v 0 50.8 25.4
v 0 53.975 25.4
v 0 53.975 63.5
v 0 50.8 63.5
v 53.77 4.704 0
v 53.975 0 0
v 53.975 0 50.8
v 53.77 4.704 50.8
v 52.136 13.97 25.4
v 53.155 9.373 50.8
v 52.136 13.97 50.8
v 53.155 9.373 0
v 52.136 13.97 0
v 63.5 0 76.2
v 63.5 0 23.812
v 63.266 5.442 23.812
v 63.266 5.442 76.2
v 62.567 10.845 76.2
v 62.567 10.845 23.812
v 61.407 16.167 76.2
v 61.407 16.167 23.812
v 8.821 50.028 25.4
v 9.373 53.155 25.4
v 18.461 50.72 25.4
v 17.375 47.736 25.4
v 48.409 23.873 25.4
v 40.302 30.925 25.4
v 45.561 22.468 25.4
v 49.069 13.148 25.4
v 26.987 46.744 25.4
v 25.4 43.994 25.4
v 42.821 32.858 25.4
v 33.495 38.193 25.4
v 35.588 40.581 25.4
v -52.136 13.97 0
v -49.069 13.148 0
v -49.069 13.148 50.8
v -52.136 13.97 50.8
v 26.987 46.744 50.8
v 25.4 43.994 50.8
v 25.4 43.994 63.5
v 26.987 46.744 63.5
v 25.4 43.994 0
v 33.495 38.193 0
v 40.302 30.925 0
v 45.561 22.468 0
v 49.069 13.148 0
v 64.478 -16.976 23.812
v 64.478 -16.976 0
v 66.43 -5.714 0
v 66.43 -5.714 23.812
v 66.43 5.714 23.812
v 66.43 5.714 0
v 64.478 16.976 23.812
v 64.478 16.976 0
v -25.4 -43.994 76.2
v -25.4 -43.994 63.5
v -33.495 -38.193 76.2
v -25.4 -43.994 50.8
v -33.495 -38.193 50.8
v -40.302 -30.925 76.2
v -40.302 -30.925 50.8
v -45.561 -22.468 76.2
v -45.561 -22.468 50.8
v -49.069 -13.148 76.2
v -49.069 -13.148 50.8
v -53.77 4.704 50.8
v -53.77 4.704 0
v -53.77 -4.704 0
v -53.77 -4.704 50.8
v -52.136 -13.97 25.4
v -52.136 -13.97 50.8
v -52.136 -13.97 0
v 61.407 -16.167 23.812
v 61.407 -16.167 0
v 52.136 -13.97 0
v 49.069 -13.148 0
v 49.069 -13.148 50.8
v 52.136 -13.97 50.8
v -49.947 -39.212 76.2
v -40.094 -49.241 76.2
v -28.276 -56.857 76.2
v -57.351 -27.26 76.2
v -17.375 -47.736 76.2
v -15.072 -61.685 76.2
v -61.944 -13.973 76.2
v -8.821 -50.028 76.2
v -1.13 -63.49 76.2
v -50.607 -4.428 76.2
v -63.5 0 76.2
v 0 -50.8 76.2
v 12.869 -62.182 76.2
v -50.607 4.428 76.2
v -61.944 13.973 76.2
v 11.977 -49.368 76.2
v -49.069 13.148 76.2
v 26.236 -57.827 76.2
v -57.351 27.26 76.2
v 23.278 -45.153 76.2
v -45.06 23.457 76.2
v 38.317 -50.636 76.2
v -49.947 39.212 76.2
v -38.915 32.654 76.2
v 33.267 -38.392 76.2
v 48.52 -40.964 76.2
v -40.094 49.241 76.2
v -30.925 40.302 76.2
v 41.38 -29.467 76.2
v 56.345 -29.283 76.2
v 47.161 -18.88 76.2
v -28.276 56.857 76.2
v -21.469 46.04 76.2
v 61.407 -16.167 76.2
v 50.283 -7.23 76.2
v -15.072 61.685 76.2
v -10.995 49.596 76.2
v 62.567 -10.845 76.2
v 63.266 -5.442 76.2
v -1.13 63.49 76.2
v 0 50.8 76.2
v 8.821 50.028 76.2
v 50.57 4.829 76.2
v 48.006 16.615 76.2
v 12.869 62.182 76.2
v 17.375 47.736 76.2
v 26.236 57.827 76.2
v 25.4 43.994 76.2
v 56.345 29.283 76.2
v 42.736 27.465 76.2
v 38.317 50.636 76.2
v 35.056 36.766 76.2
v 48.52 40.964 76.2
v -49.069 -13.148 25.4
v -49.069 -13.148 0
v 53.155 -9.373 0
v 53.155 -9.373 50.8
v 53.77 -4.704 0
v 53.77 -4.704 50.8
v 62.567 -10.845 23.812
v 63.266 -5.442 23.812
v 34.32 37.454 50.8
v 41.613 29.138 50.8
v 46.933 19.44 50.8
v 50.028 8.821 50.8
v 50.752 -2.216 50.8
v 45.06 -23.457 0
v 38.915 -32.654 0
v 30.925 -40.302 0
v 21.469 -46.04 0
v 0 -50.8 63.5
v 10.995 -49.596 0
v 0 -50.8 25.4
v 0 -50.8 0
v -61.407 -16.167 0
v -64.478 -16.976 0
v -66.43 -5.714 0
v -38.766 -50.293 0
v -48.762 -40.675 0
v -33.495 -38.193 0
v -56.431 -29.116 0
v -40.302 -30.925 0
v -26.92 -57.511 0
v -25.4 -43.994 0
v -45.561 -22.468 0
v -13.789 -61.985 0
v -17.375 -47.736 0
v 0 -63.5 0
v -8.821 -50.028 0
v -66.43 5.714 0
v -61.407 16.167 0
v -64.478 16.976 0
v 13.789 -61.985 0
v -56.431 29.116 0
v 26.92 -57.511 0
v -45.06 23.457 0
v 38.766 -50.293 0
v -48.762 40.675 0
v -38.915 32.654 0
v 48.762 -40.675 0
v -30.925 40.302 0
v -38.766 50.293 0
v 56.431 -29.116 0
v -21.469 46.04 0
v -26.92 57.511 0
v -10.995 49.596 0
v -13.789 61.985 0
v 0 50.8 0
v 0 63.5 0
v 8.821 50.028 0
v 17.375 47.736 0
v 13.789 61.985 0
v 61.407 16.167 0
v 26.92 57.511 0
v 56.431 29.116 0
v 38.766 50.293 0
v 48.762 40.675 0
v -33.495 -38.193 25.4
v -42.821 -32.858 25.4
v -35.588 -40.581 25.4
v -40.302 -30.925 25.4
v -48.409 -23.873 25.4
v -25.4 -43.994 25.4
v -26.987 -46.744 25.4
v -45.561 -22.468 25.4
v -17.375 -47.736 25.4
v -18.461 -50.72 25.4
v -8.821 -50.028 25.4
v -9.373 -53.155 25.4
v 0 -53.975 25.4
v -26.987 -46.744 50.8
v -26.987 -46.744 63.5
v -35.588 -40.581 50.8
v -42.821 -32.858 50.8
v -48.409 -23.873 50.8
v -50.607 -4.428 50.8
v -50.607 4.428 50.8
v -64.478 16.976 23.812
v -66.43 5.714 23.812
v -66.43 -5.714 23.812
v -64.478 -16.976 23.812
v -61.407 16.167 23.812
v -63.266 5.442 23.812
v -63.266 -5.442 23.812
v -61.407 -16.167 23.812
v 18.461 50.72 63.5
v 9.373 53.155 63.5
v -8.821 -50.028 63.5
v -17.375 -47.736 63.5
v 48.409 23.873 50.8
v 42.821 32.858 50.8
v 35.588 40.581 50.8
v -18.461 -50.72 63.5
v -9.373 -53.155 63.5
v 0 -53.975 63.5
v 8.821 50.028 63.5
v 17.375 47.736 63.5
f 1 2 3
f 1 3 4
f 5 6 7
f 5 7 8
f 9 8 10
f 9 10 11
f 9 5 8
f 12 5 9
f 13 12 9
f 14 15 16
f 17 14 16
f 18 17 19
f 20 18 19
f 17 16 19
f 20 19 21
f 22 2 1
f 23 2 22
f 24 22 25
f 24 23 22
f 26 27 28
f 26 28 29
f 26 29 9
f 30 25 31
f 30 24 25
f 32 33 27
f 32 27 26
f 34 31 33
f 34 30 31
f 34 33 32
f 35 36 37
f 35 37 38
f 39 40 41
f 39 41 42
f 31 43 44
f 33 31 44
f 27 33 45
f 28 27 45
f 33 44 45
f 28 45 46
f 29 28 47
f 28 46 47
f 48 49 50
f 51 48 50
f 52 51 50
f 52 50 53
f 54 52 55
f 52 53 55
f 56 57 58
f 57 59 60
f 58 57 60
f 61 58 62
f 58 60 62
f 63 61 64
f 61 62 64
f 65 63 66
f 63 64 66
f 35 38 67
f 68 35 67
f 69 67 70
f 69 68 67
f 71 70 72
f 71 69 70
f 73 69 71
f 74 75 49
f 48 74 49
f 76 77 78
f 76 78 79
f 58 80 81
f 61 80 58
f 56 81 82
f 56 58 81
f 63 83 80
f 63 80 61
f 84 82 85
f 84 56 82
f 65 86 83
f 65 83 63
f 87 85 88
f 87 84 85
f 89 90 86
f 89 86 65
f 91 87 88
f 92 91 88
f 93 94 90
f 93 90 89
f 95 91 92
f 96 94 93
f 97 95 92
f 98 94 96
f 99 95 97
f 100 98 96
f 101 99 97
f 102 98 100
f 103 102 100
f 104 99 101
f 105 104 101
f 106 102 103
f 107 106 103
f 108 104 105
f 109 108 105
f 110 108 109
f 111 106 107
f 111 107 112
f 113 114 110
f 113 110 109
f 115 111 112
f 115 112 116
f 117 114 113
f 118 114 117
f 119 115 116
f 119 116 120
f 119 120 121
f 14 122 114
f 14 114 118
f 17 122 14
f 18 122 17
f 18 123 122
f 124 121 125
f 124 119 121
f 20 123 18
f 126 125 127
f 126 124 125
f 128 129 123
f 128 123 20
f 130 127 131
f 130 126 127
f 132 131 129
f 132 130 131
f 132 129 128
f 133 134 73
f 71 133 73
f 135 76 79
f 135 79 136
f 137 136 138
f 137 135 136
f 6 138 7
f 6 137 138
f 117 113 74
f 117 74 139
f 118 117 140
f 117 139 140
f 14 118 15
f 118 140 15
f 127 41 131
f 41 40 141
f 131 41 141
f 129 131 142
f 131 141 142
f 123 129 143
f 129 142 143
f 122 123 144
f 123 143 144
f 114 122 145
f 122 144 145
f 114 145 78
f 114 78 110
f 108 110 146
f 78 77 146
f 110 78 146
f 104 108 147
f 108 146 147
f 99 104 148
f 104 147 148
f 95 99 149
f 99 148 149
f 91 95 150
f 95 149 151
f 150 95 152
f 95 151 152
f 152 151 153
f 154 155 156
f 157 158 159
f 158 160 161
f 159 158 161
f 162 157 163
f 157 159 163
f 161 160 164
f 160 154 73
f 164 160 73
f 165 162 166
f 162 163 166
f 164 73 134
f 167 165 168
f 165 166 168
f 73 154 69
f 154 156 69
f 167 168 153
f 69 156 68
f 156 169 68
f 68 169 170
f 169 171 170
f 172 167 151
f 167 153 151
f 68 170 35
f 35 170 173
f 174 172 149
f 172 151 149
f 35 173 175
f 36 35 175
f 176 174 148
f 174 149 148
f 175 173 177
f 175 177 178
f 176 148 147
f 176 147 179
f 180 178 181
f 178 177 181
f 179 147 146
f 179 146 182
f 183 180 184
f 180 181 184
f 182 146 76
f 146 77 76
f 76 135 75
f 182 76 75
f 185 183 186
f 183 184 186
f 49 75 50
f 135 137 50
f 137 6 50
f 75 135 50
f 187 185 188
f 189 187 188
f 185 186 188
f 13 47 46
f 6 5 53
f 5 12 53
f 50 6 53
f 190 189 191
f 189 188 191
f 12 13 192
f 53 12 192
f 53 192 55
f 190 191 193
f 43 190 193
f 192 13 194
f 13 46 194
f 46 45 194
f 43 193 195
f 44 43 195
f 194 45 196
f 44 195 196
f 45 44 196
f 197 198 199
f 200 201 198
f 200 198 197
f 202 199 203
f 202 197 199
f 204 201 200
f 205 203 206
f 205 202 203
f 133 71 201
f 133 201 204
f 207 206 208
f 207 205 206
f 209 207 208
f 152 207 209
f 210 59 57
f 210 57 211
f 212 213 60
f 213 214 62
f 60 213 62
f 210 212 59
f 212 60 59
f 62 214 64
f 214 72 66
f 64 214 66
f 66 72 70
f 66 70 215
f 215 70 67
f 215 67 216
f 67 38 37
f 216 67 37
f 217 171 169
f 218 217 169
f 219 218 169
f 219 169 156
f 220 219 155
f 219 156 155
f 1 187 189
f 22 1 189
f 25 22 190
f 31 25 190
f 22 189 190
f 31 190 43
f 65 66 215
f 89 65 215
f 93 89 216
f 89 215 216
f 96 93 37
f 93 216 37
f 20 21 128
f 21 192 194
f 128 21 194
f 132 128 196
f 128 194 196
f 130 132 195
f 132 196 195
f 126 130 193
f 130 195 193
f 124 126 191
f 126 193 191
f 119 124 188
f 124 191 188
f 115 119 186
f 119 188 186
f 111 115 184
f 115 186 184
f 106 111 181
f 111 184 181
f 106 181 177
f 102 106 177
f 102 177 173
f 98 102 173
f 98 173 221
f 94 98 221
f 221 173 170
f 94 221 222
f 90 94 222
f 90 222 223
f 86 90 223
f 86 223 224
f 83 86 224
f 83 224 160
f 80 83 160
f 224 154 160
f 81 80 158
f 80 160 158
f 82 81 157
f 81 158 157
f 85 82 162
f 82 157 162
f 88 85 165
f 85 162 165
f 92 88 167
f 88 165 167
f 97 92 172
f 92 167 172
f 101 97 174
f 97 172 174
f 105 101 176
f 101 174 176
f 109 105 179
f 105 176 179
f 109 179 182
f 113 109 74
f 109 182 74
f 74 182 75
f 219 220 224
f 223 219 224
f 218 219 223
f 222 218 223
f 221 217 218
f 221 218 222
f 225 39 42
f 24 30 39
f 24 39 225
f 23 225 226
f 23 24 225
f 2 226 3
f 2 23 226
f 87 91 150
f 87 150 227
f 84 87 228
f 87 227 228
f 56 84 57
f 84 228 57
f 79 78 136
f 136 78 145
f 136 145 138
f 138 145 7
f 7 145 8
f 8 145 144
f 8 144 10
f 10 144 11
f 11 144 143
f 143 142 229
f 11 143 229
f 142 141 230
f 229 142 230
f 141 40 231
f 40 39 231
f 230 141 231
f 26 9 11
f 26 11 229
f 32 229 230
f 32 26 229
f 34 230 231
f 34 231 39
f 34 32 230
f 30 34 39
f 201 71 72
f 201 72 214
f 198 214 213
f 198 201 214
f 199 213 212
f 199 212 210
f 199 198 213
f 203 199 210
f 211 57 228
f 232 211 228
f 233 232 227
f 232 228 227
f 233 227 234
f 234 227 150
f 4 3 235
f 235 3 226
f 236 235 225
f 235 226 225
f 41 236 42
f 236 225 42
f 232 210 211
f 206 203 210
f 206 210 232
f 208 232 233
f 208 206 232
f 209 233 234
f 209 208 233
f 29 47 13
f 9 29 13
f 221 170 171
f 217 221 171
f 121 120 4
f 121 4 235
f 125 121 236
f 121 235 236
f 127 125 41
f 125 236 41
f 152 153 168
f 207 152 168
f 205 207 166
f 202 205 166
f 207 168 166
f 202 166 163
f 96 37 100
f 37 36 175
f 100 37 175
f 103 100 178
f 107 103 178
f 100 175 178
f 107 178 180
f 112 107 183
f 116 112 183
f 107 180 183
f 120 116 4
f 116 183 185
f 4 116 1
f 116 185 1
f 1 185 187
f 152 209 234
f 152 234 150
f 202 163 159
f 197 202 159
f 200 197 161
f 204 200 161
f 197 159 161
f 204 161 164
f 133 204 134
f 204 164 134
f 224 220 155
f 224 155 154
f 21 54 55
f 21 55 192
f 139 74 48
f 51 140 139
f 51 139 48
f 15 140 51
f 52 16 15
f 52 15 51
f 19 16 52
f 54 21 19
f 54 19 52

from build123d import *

# Parameters (mm, degrees)
F1_DEPTH = 76.2
F2_DEPTH = 23.8125
F3_DEPTH = 50.8
F4_DEPTH = 63.5
F5_DEPTH = 25.4


# Not quite as in the source:
# - a feature names something its author has since deleted; it is built from what else it names


with BuildPart() as f1:
    # F0 (on Top) → F1 (new body)
    with BuildSketch(Plane.XY):
        with BuildLine():
            ThreePointArc((61.4074185531, -16.1672182717), (62.9746817305, -8.151040482), (63.5, 0))
            ThreePointArc((63.5, 0), (62.9746817305, 8.151040482), (61.4074185531, 16.1672182717))
            ThreePointArc((61.4074185531, 16.1672182717), (0, 63.5), (-61.4074185531, 16.1672182717))
            ThreePointArc((-61.4074185531, 16.1672182717), (-63.5, 0), (-61.4074185531, -16.1672182717))
            ThreePointArc((-61.4074185531, -16.1672182717), (0, -63.5), (61.4074185531, -16.1672182717))
        make_face()
        with BuildLine():
            ThreePointArc((26.9875, 46.7437211693), (42.8212465422, 32.8578981307), (52.135846474, 13.9697579594))
            ThreePointArc((52.135846474, 13.9697579594), (53.5132363927, 7.0451512251), (53.975, 0))
            ThreePointArc((53.975, 0), (53.5132363927, -7.0451512251), (52.135846474, -13.9697579594))
            ThreePointArc((52.135846474, -13.9697579594), (32.8578981307, -42.8212465422), (0, -53.975))
            ThreePointArc((0, -53.975), (-13.9697579594, -52.135846474), (-26.9875, -46.7437211693))
            ThreePointArc((-26.9875, -46.7437211693), (-42.8212465422, -32.8578981307), (-52.135846474, -13.9697579594))
            ThreePointArc((-52.135846474, -13.9697579594), (-53.975, 0), (-52.135846474, 13.9697579594))
            ThreePointArc((-52.135846474, 13.9697579594), (-32.8578981307, 42.8212465422), (0, 53.975))
            ThreePointArc((0, 53.975), (13.9697579594, 52.135846474), (26.9875, 46.7437211693))
        make_face(mode=Mode.SUBTRACT)
        with BuildLine():
            ThreePointArc((49.0690319755, 13.1480074912), (50.3653989578, 6.6307305648), (50.8, 0))
            ThreePointArc((50.8, 0), (50.3653989578, -6.6307305648), (49.0690319755, -13.1480074912))
            Line((49.0690319755, -13.1480074912), (52.135846474, -13.9697579594))
            ThreePointArc((52.135846474, -13.9697579594), (53.5132363927, -7.0451512251), (53.975, 0))
            ThreePointArc((53.975, 0), (53.5132363927, 7.0451512251), (52.135846474, 13.9697579594))
            Line((52.135846474, 13.9697579594), (49.0690319755, 13.1480074912))
        make_face()
        with BuildLine():
            ThreePointArc((25.4, 43.9940905122), (40.3023496868, 30.9250805936), (49.0690319755, 13.1480074912))
            Line((49.0690319755, 13.1480074912), (52.135846474, 13.9697579594))
            ThreePointArc((52.135846474, 13.9697579594), (42.8212465422, 32.8578981307), (26.9875, 46.7437211693))
            Line((26.9875, 46.7437211693), (25.4, 43.9940905122))
        make_face()
        with BuildLine():
            Line((52.135846474, -13.9697579594), (49.0690319755, -13.1480074912))
            ThreePointArc((49.0690319755, -13.1480074912), (30.9250805936, -40.3023496868), (0, -50.8))
            Line((0, -50.8), (0, -53.975))
            ThreePointArc((0, -53.975), (32.8578981307, -42.8212465422), (52.135846474, -13.9697579594))
        make_face()
        with BuildLine():
            ThreePointArc((0, 50.8), (13.1480074912, 49.0690319755), (25.4, 43.9940905122))
            Line((25.4, 43.9940905122), (26.9875, 46.7437211693))
            ThreePointArc((26.9875, 46.7437211693), (13.9697579594, 52.135846474), (0, 53.975))
            Line((0, 53.975), (0, 50.8))
        make_face()
        with BuildLine():
            Line((0, -53.975), (0, -50.8))
            ThreePointArc((0, -50.8), (-13.1480074912, -49.0690319755), (-25.4, -43.9940905122))
            Line((-25.4, -43.9940905122), (-26.9875, -46.7437211693))
            ThreePointArc((-26.9875, -46.7437211693), (-13.9697579594, -52.135846474), (0, -53.975))
        make_face()
        with BuildLine():
            ThreePointArc((-49.0690319755, 13.1480074912), (-30.9250805936, 40.3023496868), (0, 50.8))
            Line((0, 50.8), (0, 53.975))
            ThreePointArc((0, 53.975), (-32.8578981307, 42.8212465422), (-52.135846474, 13.9697579594))
            Line((-52.135846474, 13.9697579594), (-49.0690319755, 13.1480074912))
        make_face()
        with BuildLine():
            Line((-26.9875, -46.7437211693), (-25.4, -43.9940905122))
            ThreePointArc((-25.4, -43.9940905122), (-40.3023496868, -30.9250805936), (-49.0690319755, -13.1480074912))
            Line((-49.0690319755, -13.1480074912), (-52.135846474, -13.9697579594))
            ThreePointArc((-52.135846474, -13.9697579594), (-42.8212465422, -32.8578981307), (-26.9875, -46.7437211693))
        make_face()
        with BuildLine():
            ThreePointArc((-49.0690319755, -13.1480074912), (-50.8, 0), (-49.0690319755, 13.1480074912))
            Line((-49.0690319755, 13.1480074912), (-52.135846474, 13.9697579594))
            ThreePointArc((-52.135846474, 13.9697579594), (-53.975, 0), (-52.135846474, -13.9697579594))
            Line((-52.135846474, -13.9697579594), (-49.0690319755, -13.1480074912))
        make_face()
    extrude(amount=F1_DEPTH)

    # F0 (on Top) → F2 (join)
    with BuildSketch(Plane.XY):
        with BuildLine():
            ThreePointArc((-61.4074185531, -16.1672182717), (-63.5, 0), (-61.4074185531, 16.1672182717))
            Line((-61.4074185531, 16.1672182717), (-64.4777894091, 16.9755794573))
            ThreePointArc((-64.4777894091, 16.9755794573), (-66.675, 0), (-64.4777894091, -16.9755794573))
            Line((-64.4777894091, -16.9755794573), (-61.4074185531, -16.1672182717))
        make_face()
        with BuildLine():
            ThreePointArc((61.4074185531, 16.1672182717), (62.9746817305, 8.151040482), (63.5, 0))
            ThreePointArc((63.5, 0), (62.9746817305, -8.151040482), (61.4074185531, -16.1672182717))
            Line((61.4074185531, -16.1672182717), (64.4777894091, -16.9755794573))
            ThreePointArc((64.4777894091, -16.9755794573), (66.675, 0), (64.4777894091, 16.9755794573))
            Line((64.4777894091, 16.9755794573), (61.4074185531, 16.1672182717))
        make_face()
    extrude(amount=F2_DEPTH)

    # F0 (on Top) → F3 (cut)
    with BuildSketch(Plane.XY):
        with BuildLine():
            ThreePointArc((-49.0690319755, -13.1480074912), (-50.8, 0), (-49.0690319755, 13.1480074912))
            Line((-49.0690319755, 13.1480074912), (-52.135846474, 13.9697579594))
            ThreePointArc((-52.135846474, 13.9697579594), (-53.975, 0), (-52.135846474, -13.9697579594))
            Line((-52.135846474, -13.9697579594), (-49.0690319755, -13.1480074912))
        make_face()
        with BuildLine():
            ThreePointArc((49.0690319755, 13.1480074912), (50.3653989578, 6.6307305648), (50.8, 0))
            ThreePointArc((50.8, 0), (50.3653989578, -6.6307305648), (49.0690319755, -13.1480074912))
            Line((49.0690319755, -13.1480074912), (52.135846474, -13.9697579594))
            ThreePointArc((52.135846474, -13.9697579594), (53.5132363927, -7.0451512251), (53.975, 0))
            ThreePointArc((53.975, 0), (53.5132363927, 7.0451512251), (52.135846474, 13.9697579594))
            Line((52.135846474, 13.9697579594), (49.0690319755, 13.1480074912))
        make_face()
        with BuildLine():
            Line((-26.9875, -46.7437211693), (-25.4, -43.9940905122))
            ThreePointArc((-25.4, -43.9940905122), (-40.3023496868, -30.9250805936), (-49.0690319755, -13.1480074912))
            Line((-49.0690319755, -13.1480074912), (-52.135846474, -13.9697579594))
            ThreePointArc((-52.135846474, -13.9697579594), (-42.8212465422, -32.8578981307), (-26.9875, -46.7437211693))
        make_face()
        with BuildLine():
            ThreePointArc((25.4, 43.9940905122), (40.3023496868, 30.9250805936), (49.0690319755, 13.1480074912))
            Line((49.0690319755, 13.1480074912), (52.135846474, 13.9697579594))
            ThreePointArc((52.135846474, 13.9697579594), (42.8212465422, 32.8578981307), (26.9875, 46.7437211693))
            Line((26.9875, 46.7437211693), (25.4, 43.9940905122))
        make_face()
    extrude(amount=F3_DEPTH, mode=Mode.SUBTRACT)

    # F0 (on Top) → F4 (cut)
    with BuildSketch(Plane.XY):
        with BuildLine():
            Line((0, -53.975), (0, -50.8))
            ThreePointArc((0, -50.8), (-13.1480074912, -49.0690319755), (-25.4, -43.9940905122))
            Line((-25.4, -43.9940905122), (-26.9875, -46.7437211693))
            ThreePointArc((-26.9875, -46.7437211693), (-13.9697579594, -52.135846474), (0, -53.975))
        make_face()
        with BuildLine():
            ThreePointArc((0, 50.8), (13.1480074912, 49.0690319755), (25.4, 43.9940905122))
            Line((25.4, 43.9940905122), (26.9875, 46.7437211693))
            ThreePointArc((26.9875, 46.7437211693), (13.9697579594, 52.135846474), (0, 53.975))
            Line((0, 53.975), (0, 50.8))
        make_face()
    extrude(amount=F4_DEPTH, mode=Mode.SUBTRACT)

    # F0 (on Top) → F5 (join)
    with BuildSketch(Plane.XY):
        with BuildLine():
            Line((-26.9875, -46.7437211693), (-25.4, -43.9940905122))
            ThreePointArc((-25.4, -43.9940905122), (-40.3023496868, -30.9250805936), (-49.0690319755, -13.1480074912))
            Line((-49.0690319755, -13.1480074912), (-52.135846474, -13.9697579594))
            ThreePointArc((-52.135846474, -13.9697579594), (-42.8212465422, -32.8578981307), (-26.9875, -46.7437211693))
        make_face()
        with BuildLine():
            Line((0, -53.975), (0, -50.8))
            ThreePointArc((0, -50.8), (-13.1480074912, -49.0690319755), (-25.4, -43.9940905122))
            Line((-25.4, -43.9940905122), (-26.9875, -46.7437211693))
            ThreePointArc((-26.9875, -46.7437211693), (-13.9697579594, -52.135846474), (0, -53.975))
        make_face()
        with BuildLine():
            ThreePointArc((25.4, 43.9940905122), (40.3023496868, 30.9250805936), (49.0690319755, 13.1480074912))
            Line((49.0690319755, 13.1480074912), (52.135846474, 13.9697579594))
            ThreePointArc((52.135846474, 13.9697579594), (42.8212465422, 32.8578981307), (26.9875, 46.7437211693))
            Line((26.9875, 46.7437211693), (25.4, 43.9940905122))
        make_face()
        with BuildLine():
            ThreePointArc((0, 50.8), (13.1480074912, 49.0690319755), (25.4, 43.9940905122))
            Line((25.4, 43.9940905122), (26.9875, 46.7437211693))
            ThreePointArc((26.9875, 46.7437211693), (13.9697579594, 52.135846474), (0, 53.975))
            Line((0, 53.975), (0, 50.8))
        make_face()
    extrude(amount=F5_DEPTH)


solid = f1.part
